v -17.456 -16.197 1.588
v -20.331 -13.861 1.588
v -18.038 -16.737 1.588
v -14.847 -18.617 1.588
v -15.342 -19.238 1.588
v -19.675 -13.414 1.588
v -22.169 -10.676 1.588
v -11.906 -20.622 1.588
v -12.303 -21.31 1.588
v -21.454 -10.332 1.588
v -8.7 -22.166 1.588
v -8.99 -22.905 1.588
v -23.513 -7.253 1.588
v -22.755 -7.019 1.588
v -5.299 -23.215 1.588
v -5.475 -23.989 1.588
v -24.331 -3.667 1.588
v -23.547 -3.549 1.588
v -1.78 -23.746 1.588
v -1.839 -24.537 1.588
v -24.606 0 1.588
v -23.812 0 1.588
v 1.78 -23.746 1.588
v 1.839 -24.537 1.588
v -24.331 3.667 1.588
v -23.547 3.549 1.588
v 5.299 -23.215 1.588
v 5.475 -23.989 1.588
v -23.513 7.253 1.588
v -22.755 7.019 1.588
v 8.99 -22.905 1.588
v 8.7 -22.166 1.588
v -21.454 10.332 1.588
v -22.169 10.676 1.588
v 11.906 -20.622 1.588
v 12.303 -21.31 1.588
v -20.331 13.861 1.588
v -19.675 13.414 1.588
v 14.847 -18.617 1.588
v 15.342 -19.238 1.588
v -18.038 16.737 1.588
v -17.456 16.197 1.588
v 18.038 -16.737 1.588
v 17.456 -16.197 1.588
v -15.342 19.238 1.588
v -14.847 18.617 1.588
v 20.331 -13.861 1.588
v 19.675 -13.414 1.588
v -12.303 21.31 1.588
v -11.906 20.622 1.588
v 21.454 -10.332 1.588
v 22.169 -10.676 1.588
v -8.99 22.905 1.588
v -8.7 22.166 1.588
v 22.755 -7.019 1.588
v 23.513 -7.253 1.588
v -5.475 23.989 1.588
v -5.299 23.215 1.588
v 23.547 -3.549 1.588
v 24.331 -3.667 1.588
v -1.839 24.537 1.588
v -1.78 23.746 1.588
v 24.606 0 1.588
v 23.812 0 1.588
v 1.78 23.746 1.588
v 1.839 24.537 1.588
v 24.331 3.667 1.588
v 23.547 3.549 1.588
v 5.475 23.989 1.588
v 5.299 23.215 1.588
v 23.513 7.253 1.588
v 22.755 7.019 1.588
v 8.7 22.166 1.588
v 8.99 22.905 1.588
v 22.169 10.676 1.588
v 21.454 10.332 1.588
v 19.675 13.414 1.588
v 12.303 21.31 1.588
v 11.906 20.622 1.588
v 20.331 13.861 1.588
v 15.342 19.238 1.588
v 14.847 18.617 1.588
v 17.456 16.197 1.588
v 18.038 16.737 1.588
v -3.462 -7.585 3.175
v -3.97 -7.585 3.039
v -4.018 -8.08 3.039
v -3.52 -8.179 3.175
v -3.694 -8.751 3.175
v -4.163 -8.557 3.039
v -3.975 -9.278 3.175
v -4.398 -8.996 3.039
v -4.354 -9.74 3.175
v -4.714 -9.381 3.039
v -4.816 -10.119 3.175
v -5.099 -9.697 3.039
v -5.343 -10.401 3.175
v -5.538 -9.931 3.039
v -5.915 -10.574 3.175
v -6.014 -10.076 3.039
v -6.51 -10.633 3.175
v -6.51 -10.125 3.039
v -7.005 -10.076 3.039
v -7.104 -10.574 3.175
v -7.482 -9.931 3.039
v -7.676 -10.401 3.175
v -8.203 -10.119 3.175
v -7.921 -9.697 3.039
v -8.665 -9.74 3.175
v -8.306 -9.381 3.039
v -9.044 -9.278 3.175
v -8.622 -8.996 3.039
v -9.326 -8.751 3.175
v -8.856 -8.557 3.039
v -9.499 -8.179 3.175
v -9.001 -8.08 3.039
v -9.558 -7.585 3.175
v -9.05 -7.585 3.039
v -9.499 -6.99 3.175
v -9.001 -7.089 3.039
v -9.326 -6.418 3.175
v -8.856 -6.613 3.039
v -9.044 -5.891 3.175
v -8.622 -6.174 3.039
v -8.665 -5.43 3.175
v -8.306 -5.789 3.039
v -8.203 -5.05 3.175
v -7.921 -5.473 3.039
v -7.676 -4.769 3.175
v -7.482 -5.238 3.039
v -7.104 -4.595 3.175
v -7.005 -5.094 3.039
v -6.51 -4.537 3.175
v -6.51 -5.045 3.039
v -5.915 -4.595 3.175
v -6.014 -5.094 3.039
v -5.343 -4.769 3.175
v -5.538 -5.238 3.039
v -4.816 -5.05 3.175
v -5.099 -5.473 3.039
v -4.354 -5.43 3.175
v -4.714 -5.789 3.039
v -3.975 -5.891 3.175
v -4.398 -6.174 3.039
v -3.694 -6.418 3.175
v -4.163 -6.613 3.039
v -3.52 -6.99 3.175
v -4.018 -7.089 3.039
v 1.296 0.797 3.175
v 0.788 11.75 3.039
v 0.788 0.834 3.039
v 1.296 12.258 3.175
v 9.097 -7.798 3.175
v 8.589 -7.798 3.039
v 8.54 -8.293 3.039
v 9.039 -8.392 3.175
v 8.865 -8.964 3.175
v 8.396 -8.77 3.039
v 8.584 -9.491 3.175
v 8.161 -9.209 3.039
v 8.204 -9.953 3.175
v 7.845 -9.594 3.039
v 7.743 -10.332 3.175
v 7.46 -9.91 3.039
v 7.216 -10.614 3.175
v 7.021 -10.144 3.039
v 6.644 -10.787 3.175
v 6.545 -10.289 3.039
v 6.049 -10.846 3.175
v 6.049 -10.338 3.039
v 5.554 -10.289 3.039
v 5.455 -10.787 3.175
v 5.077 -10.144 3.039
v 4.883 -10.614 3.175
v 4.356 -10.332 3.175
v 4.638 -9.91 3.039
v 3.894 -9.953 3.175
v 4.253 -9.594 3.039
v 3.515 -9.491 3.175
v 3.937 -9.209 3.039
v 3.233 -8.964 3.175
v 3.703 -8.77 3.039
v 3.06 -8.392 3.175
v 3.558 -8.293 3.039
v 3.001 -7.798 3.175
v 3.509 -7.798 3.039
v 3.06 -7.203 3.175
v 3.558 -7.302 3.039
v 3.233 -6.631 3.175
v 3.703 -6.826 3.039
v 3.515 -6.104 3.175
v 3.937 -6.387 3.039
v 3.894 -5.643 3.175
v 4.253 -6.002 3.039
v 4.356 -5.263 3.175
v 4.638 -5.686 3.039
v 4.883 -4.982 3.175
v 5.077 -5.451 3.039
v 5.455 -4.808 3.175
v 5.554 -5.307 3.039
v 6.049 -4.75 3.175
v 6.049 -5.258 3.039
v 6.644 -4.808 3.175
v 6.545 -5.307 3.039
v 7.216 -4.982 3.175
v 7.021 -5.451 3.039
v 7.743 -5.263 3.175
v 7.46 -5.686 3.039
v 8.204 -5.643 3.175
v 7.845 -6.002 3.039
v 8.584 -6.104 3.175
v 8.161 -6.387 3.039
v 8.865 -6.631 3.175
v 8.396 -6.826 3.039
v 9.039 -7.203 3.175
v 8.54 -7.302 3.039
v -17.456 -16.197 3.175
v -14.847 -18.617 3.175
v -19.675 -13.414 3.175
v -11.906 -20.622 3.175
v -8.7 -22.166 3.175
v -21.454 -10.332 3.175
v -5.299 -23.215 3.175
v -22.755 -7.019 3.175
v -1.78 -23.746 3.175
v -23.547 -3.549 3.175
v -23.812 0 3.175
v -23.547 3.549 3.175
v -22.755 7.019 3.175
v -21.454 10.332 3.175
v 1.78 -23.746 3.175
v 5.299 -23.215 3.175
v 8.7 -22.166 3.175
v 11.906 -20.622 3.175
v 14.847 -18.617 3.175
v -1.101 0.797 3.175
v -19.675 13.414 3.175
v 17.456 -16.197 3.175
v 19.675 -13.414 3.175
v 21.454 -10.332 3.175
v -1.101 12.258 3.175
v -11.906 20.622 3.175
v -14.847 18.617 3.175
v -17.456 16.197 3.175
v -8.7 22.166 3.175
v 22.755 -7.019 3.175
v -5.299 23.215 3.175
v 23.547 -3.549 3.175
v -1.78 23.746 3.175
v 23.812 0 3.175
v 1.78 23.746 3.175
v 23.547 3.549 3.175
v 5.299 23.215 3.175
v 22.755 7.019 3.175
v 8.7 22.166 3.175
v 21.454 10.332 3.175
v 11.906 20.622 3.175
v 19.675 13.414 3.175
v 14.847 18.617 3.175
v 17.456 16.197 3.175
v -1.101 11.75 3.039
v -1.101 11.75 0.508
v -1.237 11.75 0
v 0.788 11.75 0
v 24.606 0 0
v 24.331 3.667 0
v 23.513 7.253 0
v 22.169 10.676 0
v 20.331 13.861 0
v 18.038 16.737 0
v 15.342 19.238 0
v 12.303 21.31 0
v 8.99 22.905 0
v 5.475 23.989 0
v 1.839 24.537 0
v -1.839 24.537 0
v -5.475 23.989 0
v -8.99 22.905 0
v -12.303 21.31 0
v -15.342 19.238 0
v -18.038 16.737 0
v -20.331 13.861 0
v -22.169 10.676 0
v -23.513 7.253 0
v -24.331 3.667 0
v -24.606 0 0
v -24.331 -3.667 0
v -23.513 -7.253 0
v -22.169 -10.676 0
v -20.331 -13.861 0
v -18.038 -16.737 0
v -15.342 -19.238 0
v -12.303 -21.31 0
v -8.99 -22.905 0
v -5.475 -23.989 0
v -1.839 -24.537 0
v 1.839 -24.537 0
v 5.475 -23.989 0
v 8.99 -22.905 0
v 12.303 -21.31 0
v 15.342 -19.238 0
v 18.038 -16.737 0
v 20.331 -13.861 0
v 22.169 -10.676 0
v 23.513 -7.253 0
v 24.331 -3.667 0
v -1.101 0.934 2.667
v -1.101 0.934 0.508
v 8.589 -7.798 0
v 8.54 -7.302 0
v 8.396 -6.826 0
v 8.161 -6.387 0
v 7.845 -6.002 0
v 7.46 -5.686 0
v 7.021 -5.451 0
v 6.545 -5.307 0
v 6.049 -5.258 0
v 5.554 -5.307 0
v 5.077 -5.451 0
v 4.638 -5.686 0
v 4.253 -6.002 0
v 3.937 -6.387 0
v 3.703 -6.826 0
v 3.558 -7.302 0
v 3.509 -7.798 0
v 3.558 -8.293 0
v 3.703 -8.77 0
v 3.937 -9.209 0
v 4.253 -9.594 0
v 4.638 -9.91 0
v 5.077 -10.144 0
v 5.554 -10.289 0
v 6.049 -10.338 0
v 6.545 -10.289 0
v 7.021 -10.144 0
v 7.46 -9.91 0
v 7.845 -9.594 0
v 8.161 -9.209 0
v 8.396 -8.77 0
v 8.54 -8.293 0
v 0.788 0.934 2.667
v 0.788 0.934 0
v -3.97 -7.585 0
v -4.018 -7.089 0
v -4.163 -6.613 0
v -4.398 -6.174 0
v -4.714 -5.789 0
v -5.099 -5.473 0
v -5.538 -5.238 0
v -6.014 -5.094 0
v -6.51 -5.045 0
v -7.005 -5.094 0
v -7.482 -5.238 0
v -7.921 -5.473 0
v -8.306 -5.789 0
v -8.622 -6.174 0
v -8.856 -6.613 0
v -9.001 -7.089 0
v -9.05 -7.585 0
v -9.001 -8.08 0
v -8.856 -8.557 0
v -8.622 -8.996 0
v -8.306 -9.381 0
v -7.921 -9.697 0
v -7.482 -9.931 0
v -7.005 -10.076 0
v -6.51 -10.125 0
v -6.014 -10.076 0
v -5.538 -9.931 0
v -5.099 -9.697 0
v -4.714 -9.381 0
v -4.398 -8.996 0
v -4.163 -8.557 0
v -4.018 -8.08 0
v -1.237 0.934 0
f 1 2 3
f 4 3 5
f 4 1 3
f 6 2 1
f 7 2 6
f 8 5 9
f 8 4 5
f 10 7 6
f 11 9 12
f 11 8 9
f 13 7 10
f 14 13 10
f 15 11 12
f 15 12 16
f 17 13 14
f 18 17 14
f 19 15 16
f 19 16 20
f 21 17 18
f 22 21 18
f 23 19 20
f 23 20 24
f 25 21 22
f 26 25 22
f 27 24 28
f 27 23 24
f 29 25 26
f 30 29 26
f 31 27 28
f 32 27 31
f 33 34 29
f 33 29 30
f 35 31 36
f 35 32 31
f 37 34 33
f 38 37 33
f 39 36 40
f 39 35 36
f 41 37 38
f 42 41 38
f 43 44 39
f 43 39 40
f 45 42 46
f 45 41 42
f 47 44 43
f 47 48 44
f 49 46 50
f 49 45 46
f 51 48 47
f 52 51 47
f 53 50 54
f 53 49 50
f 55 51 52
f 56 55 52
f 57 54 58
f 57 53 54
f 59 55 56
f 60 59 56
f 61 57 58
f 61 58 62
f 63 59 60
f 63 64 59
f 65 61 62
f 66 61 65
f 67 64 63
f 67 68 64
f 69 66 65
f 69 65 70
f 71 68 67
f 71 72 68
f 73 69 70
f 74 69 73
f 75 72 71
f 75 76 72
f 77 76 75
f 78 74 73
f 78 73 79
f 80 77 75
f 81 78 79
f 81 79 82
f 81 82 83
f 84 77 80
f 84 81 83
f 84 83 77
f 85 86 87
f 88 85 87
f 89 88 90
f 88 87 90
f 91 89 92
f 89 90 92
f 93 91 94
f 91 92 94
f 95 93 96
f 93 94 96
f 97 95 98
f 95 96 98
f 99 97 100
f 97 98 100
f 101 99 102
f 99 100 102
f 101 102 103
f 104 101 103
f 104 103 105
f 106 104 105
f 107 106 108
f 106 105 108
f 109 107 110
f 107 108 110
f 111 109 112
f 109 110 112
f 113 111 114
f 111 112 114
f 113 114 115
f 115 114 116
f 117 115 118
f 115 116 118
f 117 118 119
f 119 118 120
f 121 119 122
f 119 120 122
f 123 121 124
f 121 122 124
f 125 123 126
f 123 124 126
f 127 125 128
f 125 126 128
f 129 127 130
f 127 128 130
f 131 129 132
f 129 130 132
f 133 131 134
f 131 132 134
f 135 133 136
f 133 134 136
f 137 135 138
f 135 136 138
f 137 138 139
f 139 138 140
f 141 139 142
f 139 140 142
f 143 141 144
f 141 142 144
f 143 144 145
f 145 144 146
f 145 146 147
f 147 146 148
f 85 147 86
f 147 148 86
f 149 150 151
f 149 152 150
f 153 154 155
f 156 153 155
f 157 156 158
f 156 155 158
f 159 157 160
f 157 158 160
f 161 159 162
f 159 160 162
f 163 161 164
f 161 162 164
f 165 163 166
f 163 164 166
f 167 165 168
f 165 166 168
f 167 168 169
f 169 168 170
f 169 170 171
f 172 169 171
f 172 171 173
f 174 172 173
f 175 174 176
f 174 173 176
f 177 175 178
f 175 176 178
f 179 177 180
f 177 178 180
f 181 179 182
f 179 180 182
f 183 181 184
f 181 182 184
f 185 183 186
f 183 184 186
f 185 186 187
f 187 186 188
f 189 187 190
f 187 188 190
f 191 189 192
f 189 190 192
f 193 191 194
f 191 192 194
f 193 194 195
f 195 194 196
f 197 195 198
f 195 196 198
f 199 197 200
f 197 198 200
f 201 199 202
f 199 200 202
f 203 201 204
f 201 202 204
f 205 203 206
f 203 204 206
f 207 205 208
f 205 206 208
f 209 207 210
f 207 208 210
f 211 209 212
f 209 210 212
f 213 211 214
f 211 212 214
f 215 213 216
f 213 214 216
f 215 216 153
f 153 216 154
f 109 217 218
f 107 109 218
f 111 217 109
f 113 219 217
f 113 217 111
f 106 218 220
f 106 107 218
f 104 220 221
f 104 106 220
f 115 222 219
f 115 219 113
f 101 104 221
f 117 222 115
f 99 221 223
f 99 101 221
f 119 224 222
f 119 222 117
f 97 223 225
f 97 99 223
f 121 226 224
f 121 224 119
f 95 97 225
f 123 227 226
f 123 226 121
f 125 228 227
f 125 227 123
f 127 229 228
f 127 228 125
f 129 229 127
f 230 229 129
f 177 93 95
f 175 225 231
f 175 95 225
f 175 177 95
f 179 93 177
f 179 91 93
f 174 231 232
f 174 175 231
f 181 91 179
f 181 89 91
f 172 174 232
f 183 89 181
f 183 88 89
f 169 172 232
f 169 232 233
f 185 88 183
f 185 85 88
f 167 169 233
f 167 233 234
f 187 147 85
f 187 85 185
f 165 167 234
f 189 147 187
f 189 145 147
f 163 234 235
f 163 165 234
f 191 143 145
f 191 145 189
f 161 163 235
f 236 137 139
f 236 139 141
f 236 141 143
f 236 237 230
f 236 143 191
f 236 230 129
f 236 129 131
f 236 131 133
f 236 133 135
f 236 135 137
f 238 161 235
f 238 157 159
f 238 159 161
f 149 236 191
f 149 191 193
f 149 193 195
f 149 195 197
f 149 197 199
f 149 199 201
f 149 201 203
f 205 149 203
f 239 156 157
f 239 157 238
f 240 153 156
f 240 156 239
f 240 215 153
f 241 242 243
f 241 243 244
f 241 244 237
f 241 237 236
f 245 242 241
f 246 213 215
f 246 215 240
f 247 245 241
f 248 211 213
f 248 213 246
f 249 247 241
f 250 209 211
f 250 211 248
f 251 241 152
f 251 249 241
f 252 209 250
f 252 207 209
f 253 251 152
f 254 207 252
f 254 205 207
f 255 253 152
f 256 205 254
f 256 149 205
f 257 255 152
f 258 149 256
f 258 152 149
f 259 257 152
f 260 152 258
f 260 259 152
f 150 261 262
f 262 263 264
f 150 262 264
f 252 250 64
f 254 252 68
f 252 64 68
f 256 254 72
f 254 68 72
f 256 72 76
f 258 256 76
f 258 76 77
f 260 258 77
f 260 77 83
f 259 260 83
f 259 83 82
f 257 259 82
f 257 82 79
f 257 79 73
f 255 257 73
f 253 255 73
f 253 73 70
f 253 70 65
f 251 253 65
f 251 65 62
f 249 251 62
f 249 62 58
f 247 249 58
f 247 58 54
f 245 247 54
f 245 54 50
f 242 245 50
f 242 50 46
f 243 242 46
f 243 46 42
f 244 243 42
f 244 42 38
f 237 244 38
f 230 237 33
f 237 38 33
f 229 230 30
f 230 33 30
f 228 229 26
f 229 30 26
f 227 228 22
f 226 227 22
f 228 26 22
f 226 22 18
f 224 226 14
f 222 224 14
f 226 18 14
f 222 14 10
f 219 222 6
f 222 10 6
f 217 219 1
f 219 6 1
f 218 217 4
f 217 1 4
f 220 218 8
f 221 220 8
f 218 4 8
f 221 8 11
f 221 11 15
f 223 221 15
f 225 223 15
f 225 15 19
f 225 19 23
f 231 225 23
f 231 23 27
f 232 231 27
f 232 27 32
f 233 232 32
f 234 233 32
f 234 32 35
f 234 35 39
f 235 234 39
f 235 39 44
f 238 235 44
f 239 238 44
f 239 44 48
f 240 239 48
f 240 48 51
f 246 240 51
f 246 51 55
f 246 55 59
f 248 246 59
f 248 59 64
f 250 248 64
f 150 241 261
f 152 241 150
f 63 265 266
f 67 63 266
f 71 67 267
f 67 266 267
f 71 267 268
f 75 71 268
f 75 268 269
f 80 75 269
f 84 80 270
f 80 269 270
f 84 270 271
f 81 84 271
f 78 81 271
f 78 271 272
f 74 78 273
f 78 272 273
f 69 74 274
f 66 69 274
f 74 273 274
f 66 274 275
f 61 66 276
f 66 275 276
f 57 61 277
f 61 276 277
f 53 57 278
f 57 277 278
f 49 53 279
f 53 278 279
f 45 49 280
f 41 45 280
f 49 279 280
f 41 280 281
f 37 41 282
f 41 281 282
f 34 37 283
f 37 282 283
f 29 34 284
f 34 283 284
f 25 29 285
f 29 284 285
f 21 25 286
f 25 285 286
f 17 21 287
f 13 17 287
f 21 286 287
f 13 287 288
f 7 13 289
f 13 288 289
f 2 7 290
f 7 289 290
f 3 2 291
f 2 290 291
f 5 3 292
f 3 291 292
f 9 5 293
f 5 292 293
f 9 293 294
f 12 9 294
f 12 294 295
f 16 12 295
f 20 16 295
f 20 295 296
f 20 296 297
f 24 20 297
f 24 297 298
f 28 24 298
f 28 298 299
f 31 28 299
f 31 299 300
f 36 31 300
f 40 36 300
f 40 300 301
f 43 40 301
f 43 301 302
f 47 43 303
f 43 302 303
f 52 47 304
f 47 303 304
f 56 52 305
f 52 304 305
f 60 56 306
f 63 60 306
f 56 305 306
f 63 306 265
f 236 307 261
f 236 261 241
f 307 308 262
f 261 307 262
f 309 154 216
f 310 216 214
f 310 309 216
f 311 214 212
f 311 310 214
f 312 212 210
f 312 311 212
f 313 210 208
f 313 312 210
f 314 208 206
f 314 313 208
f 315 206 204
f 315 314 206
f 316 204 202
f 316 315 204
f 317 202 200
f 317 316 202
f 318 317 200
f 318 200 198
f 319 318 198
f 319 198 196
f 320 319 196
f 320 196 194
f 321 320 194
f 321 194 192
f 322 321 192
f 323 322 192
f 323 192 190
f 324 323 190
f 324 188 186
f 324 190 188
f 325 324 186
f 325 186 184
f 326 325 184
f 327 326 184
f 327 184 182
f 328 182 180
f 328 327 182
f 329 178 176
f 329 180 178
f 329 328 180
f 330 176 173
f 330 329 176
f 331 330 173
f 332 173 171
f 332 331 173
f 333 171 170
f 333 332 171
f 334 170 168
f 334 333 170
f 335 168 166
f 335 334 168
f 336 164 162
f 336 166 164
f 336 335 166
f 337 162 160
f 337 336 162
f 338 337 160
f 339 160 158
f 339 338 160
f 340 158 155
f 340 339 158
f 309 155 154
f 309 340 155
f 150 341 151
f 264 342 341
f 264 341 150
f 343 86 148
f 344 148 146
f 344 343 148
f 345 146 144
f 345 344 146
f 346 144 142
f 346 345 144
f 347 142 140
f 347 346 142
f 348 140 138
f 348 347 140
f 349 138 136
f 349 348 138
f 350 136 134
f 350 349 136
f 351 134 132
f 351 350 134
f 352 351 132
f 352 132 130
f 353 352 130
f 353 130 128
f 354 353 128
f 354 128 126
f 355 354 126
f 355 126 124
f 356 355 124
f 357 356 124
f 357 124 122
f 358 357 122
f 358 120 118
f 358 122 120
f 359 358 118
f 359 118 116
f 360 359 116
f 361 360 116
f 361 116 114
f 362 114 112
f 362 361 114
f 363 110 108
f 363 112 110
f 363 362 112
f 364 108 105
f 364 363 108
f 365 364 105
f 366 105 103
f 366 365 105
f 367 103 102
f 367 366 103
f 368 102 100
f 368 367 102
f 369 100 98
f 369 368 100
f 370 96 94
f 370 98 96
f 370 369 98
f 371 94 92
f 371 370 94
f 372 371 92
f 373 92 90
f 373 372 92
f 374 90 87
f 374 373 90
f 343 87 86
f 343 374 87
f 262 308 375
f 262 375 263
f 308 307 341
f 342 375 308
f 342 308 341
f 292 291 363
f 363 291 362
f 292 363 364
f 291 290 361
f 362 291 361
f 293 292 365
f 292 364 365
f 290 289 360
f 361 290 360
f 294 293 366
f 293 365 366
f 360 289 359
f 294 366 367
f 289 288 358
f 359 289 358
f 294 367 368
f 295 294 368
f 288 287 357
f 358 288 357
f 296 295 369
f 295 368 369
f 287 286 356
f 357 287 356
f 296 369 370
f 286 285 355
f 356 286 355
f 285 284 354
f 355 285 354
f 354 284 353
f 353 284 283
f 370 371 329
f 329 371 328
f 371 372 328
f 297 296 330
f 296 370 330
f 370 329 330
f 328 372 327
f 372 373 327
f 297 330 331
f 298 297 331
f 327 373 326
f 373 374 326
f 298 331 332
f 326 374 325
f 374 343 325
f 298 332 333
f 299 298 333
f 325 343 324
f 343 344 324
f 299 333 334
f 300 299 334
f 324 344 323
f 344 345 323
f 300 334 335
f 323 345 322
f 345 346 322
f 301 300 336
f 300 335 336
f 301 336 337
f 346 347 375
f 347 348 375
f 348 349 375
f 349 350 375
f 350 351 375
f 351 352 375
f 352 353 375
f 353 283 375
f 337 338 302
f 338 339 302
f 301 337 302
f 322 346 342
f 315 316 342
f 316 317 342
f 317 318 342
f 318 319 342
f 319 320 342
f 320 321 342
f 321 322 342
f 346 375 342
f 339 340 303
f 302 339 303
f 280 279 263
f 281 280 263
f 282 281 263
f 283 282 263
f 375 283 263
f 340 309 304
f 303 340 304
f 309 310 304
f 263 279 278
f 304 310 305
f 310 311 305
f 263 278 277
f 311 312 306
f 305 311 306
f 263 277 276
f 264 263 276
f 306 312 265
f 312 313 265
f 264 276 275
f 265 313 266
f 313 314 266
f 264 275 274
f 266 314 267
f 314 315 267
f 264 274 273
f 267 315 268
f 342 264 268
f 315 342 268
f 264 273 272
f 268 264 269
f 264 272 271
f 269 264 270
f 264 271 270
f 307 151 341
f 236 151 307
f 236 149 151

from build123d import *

# Parameters (mm, degrees)
F0_R         = 24.60625
F1_DEPTH     = 1.5875
F2_R         = 23.8125
F3_DEPTH     = 3.175
F6_W         = 1.888648374
F6_H         = 10.8168021543
F7_DEPTH     = 3.176
F5_R         = 2.54
F8_DEPTH     = 3.176
F4_R         = 2.54
F9_DEPTH     = 3.176
F10_C1_SIZE2 = 0.508
F10_C1_SIZE  = 0.1361181898
F10_C2_SIZE2 = 0.1361181898
F10_C2_SIZE  = 0.508
F10_C3_SIZE2 = 0.508
F10_C3_SIZE  = 0.1361181898
F10_C4_SIZE2 = 0.508
F10_C4_SIZE  = 0.1361181898
F11_SIZE2    = 0.1361181898
F11_SIZE     = 0.508
F12_SIZE2    = 0.1361181898
F12_SIZE     = 0.508


# Not quite as in the source:
# - a length typed as a fraction of an inch, garbled in the dataset ("3 / 203.2 mm" for 3/8 in), is restored


with BuildPart() as f1:
    # F0 (on Top) → F1 (new body)
    with BuildSketch(Plane.XY):
        Circle(F0_R)
    extrude(amount=F1_DEPTH)

    # F2 (on Top) → F3 (join)
    with BuildSketch(Plane.XY):
        Circle(F2_R)
    extrude(amount=F3_DEPTH)

    # F6 (on Top) → F7 (cut, through all)
    with BuildSketch(Plane.XY):
        with Locations((-0.156514463, 6.341986882)):
            Rectangle(F6_W, F6_H)
    extrude(amount=F7_DEPTH, mode=Mode.SUBTRACT)

    # F5 (on Top) → F8 (cut, through all)
    with BuildSketch(Plane.XY):
        with Locations((6.0491965251, -7.797766786)):
            Circle(F5_R)
    extrude(amount=F8_DEPTH, mode=Mode.SUBTRACT)

    # F4 (on Top) → F9 (cut, through all)
    with BuildSketch(Plane.XY):
        with Locations((-6.5096618418, -7.5848015673)):
            Circle(F4_R)
    extrude(amount=F9_DEPTH, mode=Mode.SUBTRACT)

    # F10: chamfer of 0.508 x 0.1361181898 on 4 edges, made by hand

    # F10_c1
    f10_c1_edges = [f1.edges().sort_by_distance(p)[0] for p in [
        (-1.10083865, 6.341986882, 0),
    ]]
    f10_c1_side = f1.faces().sort_by_distance((-1.1035610138, 6.341986882, 0))[0]
    chamfer(f10_c1_edges, length=F10_C1_SIZE, length2=F10_C1_SIZE2, reference=f10_c1_side)

    # F10_c2
    f10_c2_edges = [f1.edges().sort_by_distance(p)[0] for p in [
        (-0.156514463, 0.9335858049, 3.175),
    ]]
    f10_c2_side = f1.faces().sort_by_distance((-0.156514463, 0.9335858049, 3.1722776362))[0]
    chamfer(f10_c2_edges, length=F10_C2_SIZE, length2=F10_C2_SIZE2, reference=f10_c2_side)

    # F10_c3
    f10_c3_edges = [f1.edges().sort_by_distance(p)[0] for p in [
        (0.787809724, 6.341986882, 3.175),
    ]]
    f10_c3_side = f1.faces().sort_by_distance((0.787809724, 6.341986882, 3.1722776362))[0]
    chamfer(f10_c3_edges, length=F10_C3_SIZE, length2=F10_C3_SIZE2, reference=f10_c3_side)

    # F10_c4
    f10_c4_edges = [f1.edges().sort_by_distance(p)[0] for p in [
        (-0.156514463, 11.7503879592, 3.175),
    ]]
    f10_c4_side = f1.faces().sort_by_distance((-0.156514463, 11.7503879592, 3.1722776362))[0]
    chamfer(f10_c4_edges, length=F10_C4_SIZE, length2=F10_C4_SIZE2, reference=f10_c4_side)

    # F11
    f11_edges = [f1.edges().sort_by_distance(p)[0] for p in [
        (-9.049662, -7.584802, 3.175),
    ]]
    chamfer(f11_edges, length=F11_SIZE, length2=F11_SIZE2)

    # F12
    f12_edges = [f1.edges().sort_by_distance(p)[0] for p in [
        (3.509197, -7.797767, 3.175),
    ]]
    chamfer(f12_edges, length=F12_SIZE, length2=F12_SIZE2)


solid = f1.part
